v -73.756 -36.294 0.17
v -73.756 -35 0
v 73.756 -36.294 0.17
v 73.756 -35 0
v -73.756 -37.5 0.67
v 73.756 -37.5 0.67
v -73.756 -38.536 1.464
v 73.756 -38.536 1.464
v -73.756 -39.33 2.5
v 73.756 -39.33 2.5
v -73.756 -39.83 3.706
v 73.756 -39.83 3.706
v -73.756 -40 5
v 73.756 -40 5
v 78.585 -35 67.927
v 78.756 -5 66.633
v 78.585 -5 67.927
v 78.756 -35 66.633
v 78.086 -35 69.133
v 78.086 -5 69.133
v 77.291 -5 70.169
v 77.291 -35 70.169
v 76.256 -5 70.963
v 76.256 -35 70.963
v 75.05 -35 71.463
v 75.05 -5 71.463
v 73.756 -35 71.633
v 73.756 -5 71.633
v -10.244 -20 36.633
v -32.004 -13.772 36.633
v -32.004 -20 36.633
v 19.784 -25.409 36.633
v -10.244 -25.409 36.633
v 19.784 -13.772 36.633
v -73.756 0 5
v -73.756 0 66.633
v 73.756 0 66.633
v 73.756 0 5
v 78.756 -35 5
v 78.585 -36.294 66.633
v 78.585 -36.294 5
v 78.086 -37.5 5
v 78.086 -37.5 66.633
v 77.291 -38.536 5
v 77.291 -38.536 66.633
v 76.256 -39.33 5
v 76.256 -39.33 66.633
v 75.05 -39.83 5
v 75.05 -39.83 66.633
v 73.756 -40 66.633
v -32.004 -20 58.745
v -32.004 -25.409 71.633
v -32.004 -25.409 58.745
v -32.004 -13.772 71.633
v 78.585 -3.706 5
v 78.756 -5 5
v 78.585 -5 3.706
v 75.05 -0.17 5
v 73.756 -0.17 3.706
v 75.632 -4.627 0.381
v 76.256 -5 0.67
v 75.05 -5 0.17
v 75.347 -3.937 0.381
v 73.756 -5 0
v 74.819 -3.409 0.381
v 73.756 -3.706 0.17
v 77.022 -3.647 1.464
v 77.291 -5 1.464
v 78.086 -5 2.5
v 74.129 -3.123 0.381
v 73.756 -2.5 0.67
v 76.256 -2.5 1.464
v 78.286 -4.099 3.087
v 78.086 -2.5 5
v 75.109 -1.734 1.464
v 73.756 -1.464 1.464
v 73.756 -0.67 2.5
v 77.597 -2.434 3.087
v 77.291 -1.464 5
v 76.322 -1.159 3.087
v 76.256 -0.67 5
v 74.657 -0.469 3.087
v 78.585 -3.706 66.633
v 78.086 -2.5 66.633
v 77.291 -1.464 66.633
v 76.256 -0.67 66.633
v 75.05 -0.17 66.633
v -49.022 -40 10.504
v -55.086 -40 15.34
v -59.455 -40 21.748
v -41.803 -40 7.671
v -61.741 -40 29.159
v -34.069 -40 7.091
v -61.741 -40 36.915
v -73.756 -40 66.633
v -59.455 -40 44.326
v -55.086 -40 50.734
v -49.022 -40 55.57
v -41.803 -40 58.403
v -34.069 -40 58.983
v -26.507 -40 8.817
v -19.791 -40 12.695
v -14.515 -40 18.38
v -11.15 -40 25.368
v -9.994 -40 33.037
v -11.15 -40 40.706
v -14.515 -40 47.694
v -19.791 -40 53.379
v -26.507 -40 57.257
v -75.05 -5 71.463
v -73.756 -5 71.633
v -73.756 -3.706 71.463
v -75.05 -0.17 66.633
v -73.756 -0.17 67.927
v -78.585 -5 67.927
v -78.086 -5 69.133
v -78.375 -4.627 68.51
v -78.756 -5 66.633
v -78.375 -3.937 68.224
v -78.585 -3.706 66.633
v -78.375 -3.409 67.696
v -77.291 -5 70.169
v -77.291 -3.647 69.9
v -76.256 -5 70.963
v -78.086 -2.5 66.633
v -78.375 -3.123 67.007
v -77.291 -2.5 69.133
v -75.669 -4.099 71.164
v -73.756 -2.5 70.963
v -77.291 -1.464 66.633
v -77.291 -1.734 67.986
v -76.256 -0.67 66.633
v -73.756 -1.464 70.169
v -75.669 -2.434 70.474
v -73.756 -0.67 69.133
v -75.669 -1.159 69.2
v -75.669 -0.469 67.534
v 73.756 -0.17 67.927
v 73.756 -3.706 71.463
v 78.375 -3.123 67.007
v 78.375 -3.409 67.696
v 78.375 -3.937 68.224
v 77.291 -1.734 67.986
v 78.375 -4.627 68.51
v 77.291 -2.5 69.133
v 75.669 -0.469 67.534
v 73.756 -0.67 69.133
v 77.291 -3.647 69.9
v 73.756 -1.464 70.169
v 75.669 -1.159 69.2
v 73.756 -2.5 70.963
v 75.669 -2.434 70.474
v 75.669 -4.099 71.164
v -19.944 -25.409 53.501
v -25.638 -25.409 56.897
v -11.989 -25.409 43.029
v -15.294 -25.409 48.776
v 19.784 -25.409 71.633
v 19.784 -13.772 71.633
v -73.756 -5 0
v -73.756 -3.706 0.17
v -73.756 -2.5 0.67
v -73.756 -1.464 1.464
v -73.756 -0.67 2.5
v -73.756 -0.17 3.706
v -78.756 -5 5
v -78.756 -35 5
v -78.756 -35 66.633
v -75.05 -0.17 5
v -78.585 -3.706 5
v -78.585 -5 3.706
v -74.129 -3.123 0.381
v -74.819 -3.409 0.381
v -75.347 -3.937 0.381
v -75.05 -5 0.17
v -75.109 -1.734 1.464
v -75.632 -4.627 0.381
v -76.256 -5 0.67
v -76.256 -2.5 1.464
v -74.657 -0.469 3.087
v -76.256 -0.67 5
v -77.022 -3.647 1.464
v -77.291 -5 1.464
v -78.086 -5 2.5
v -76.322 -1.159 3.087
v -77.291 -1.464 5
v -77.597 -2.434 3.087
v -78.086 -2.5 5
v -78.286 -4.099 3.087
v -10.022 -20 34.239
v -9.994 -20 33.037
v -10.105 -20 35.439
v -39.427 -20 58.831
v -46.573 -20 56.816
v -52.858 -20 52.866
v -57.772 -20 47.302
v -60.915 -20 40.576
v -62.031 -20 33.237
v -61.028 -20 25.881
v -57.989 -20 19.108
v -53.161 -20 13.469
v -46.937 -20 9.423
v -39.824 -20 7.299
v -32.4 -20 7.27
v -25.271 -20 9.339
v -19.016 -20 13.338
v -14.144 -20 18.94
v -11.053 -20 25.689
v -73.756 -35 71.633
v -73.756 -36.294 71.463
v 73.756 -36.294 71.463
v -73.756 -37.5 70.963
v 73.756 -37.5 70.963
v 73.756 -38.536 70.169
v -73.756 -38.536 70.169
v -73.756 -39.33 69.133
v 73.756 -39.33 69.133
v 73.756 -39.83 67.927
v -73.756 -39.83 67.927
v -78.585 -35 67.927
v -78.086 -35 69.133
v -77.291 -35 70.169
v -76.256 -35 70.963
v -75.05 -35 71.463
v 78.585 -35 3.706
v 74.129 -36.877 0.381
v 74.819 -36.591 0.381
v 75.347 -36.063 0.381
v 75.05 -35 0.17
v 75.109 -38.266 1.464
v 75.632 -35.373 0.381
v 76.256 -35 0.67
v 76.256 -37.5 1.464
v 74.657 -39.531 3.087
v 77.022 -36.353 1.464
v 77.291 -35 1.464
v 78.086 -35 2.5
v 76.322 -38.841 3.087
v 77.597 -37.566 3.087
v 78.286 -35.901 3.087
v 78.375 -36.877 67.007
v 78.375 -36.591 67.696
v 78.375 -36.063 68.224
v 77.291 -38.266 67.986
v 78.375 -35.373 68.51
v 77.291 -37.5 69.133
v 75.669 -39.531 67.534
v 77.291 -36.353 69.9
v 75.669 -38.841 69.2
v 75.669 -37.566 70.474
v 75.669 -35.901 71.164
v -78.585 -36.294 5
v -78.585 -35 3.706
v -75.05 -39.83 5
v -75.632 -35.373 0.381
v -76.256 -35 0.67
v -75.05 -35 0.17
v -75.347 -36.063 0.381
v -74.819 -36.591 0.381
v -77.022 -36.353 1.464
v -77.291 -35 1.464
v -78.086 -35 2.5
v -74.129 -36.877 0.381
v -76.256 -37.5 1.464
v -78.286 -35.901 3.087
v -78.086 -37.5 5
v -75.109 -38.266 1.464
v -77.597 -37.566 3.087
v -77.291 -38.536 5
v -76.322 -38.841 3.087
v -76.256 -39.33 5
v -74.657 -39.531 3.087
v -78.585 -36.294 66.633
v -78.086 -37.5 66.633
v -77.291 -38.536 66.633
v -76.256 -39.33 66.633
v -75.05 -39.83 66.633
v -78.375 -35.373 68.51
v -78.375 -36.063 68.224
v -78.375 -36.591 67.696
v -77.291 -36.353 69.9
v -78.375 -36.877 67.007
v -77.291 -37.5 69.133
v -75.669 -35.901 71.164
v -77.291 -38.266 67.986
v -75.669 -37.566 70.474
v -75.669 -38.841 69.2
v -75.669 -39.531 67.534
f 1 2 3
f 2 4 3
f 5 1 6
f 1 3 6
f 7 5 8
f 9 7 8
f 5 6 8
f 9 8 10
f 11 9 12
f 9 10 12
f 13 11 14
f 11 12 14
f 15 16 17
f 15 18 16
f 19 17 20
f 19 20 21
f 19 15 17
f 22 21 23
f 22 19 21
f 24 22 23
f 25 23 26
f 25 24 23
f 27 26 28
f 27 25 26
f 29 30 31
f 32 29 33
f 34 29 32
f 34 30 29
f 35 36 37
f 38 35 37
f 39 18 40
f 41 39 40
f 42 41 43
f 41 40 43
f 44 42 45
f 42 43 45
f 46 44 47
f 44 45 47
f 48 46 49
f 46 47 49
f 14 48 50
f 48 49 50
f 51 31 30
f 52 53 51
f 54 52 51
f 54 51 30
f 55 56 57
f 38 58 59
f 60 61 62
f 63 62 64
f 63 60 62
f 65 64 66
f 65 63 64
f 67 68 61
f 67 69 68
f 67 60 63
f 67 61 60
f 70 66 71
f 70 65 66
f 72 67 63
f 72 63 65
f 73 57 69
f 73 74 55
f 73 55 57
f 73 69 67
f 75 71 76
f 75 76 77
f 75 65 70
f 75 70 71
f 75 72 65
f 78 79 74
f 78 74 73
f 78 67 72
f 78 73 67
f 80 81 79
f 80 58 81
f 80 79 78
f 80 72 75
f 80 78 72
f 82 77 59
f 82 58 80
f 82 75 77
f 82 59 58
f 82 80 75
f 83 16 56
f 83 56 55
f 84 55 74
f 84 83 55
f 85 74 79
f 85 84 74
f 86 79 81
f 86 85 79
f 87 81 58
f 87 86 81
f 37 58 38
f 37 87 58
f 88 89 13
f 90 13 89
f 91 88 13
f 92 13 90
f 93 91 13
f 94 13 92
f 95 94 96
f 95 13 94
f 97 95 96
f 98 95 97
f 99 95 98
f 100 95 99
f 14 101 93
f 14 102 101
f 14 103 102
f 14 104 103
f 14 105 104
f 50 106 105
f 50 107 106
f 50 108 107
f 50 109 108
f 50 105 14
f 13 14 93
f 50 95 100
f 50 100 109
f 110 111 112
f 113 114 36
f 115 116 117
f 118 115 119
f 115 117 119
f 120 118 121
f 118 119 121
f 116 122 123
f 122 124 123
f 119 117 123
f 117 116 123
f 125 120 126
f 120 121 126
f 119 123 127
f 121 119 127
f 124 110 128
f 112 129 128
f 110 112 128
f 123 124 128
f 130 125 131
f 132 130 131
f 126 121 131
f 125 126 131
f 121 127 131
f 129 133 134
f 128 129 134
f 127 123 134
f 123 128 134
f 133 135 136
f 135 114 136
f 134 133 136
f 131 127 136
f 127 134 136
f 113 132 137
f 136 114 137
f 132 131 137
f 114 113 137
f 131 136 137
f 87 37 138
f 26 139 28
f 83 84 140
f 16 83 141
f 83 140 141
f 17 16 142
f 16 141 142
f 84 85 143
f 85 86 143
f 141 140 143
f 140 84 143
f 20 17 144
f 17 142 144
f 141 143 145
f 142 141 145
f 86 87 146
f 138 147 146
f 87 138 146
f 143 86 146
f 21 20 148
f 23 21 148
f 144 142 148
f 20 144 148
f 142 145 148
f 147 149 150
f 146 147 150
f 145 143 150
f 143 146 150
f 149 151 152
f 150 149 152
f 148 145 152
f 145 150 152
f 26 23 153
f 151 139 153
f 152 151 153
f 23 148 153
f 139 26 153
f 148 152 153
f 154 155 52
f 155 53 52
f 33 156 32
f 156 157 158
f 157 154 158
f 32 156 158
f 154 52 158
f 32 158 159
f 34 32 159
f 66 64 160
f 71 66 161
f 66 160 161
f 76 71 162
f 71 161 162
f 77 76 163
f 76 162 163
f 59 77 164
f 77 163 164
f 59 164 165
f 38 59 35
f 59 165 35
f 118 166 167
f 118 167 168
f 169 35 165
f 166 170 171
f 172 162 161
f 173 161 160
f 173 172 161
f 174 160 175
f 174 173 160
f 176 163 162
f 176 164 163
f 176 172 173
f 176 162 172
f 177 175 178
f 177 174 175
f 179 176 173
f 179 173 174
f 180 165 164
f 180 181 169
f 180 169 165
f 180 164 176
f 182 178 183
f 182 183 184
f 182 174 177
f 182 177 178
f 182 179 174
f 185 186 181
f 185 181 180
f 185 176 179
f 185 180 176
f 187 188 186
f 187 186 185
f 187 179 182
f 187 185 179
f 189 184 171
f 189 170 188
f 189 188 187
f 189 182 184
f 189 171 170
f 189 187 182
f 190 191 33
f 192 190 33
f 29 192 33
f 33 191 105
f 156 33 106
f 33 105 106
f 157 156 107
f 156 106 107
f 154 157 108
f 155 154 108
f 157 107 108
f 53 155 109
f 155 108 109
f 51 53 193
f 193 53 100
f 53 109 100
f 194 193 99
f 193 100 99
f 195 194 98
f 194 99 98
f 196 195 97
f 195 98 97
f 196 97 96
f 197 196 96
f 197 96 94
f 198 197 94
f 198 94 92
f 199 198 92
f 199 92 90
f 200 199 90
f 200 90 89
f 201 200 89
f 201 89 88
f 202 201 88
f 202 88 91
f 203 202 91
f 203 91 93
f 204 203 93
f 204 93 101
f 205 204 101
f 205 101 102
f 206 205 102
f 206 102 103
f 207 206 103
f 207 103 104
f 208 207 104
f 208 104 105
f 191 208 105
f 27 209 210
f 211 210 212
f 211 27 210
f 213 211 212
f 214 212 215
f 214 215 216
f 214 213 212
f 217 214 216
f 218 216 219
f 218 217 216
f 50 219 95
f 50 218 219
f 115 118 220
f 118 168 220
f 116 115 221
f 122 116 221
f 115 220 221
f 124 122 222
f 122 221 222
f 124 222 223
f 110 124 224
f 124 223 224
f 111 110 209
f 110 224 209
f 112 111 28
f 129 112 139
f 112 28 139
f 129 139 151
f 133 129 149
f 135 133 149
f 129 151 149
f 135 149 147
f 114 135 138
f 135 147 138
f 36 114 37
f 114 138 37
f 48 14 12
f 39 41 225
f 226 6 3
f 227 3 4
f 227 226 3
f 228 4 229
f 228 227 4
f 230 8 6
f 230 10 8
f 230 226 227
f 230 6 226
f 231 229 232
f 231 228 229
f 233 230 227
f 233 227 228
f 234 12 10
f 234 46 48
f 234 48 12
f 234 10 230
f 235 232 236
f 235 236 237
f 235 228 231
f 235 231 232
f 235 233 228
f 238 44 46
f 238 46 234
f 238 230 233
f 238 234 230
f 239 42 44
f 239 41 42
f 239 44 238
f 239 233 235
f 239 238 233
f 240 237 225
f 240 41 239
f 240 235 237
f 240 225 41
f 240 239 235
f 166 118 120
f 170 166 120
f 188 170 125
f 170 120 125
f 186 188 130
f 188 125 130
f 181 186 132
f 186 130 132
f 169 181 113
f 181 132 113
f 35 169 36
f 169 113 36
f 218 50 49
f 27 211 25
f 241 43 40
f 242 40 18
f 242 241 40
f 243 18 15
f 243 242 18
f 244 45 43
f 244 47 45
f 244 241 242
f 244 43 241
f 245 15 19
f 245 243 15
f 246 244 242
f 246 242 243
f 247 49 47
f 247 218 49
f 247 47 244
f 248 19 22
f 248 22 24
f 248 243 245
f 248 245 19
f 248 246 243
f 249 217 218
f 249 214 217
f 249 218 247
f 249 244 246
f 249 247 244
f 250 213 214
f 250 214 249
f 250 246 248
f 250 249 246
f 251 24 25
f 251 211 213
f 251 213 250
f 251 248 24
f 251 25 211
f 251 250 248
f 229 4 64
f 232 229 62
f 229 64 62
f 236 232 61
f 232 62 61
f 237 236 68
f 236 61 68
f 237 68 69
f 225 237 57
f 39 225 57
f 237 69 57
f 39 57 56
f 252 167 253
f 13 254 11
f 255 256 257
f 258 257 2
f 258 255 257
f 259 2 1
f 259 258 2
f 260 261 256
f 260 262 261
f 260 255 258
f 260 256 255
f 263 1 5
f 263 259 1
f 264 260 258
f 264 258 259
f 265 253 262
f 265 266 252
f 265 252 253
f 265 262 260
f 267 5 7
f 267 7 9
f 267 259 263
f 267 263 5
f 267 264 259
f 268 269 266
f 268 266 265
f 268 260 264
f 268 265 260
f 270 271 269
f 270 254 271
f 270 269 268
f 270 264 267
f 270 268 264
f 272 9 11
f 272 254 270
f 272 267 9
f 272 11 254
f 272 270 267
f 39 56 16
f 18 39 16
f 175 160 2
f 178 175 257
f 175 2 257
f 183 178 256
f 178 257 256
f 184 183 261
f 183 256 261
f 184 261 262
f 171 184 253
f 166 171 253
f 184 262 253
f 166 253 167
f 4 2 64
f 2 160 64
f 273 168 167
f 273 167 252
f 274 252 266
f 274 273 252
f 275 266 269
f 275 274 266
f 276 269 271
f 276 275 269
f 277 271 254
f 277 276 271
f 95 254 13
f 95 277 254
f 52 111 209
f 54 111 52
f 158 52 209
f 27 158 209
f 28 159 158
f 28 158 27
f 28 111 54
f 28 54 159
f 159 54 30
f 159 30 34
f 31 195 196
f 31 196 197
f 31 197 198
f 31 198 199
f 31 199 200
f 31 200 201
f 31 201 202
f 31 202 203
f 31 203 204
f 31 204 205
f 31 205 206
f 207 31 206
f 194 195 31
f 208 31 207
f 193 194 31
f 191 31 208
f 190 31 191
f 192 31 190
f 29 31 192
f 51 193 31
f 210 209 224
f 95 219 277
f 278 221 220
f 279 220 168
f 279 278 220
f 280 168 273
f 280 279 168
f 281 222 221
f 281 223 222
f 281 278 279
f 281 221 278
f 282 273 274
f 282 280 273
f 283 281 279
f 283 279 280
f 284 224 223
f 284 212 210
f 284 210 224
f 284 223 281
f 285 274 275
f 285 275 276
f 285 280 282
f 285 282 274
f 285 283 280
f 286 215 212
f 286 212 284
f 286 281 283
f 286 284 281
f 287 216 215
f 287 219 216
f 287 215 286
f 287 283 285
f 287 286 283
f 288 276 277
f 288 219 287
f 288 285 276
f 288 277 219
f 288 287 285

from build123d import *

# Parameters (mm, degrees)
F0_W     = 157.5113609433
F0_H     = 71.6332271695
F1_DEPTH = 40
F2_R     = 5
F3_R     = 26.0186453027
F4_DEPTH = 20
F5_W     = 51.7887976021
F5_H     = 11.637929827
F6_DEPTH = 35
F7_R     = 5


# Not quite as in the source:
# - the program builds the solid bodies; features that only make, move or delete a surface that nothing else refers to are left out


with BuildPart() as f1:
    # F0 (on Front) → F1 (new body)
    with BuildSketch(Plane.XZ):
        with Locations((3.7253e-06, 35.8166135848)):
            Rectangle(F0_W, F0_H)
    extrude(amount=F1_DEPTH)

    # F2
    f2_edges = [f1.edges().sort_by_distance(p)[0] for p in [
        (4e-06, -40, 71.633227),
        (4e-06, 0, 71.633227),
        (78.755684, -40, 35.816614),
        (78.755684, 0, 35.816614),
        (78.755684, -20, 71.633227),
        (-78.755677, -20, 71.633227),
        (-78.755677, 0, 35.816614),
        (-78.755677, -40, 35.816614),
    ]]
    fillet(f2_edges, radius=F2_R)

    # F3 (on face) → F4 (cut)
    with BuildSketch(Plane.XZ.offset(40)):
        with Locations((-36.0129252076, 33.036891371)):
            Circle(F3_R)
    extrude(amount=-F4_DEPTH, mode=Mode.SUBTRACT)

    # F5 (on face) → F6 (cut)
    with BuildSketch(Plane.XY.offset(71.6332271695)):
        with Locations((-6.1099091545, -19.590517506)):
            Rectangle(F5_W, F5_H)
    extrude(amount=-F6_DEPTH, mode=Mode.SUBTRACT)

    # F7
    f7_edges = [f1.edges().sort_by_distance(p)[0] for p in [
        (4e-06, -40, 0),
    ]]
    fillet(f7_edges, radius=F7_R)


solid = f1.part
